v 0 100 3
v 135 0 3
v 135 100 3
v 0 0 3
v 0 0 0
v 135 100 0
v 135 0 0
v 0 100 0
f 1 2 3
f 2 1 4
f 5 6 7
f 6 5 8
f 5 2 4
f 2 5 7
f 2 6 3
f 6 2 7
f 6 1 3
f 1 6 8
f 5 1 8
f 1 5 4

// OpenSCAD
/*
	freiBot axis
	robot axis for freiBot
	2015 by stochri
*/

// 

Grundplatte_Laenge=135;
Grundplatte_Breite=100;
Grundplatee_Hoehe=3;

cube(size=[Grundplatte_Laenge,Grundplatte_Breite,Grundplatee_Hoehe]);
